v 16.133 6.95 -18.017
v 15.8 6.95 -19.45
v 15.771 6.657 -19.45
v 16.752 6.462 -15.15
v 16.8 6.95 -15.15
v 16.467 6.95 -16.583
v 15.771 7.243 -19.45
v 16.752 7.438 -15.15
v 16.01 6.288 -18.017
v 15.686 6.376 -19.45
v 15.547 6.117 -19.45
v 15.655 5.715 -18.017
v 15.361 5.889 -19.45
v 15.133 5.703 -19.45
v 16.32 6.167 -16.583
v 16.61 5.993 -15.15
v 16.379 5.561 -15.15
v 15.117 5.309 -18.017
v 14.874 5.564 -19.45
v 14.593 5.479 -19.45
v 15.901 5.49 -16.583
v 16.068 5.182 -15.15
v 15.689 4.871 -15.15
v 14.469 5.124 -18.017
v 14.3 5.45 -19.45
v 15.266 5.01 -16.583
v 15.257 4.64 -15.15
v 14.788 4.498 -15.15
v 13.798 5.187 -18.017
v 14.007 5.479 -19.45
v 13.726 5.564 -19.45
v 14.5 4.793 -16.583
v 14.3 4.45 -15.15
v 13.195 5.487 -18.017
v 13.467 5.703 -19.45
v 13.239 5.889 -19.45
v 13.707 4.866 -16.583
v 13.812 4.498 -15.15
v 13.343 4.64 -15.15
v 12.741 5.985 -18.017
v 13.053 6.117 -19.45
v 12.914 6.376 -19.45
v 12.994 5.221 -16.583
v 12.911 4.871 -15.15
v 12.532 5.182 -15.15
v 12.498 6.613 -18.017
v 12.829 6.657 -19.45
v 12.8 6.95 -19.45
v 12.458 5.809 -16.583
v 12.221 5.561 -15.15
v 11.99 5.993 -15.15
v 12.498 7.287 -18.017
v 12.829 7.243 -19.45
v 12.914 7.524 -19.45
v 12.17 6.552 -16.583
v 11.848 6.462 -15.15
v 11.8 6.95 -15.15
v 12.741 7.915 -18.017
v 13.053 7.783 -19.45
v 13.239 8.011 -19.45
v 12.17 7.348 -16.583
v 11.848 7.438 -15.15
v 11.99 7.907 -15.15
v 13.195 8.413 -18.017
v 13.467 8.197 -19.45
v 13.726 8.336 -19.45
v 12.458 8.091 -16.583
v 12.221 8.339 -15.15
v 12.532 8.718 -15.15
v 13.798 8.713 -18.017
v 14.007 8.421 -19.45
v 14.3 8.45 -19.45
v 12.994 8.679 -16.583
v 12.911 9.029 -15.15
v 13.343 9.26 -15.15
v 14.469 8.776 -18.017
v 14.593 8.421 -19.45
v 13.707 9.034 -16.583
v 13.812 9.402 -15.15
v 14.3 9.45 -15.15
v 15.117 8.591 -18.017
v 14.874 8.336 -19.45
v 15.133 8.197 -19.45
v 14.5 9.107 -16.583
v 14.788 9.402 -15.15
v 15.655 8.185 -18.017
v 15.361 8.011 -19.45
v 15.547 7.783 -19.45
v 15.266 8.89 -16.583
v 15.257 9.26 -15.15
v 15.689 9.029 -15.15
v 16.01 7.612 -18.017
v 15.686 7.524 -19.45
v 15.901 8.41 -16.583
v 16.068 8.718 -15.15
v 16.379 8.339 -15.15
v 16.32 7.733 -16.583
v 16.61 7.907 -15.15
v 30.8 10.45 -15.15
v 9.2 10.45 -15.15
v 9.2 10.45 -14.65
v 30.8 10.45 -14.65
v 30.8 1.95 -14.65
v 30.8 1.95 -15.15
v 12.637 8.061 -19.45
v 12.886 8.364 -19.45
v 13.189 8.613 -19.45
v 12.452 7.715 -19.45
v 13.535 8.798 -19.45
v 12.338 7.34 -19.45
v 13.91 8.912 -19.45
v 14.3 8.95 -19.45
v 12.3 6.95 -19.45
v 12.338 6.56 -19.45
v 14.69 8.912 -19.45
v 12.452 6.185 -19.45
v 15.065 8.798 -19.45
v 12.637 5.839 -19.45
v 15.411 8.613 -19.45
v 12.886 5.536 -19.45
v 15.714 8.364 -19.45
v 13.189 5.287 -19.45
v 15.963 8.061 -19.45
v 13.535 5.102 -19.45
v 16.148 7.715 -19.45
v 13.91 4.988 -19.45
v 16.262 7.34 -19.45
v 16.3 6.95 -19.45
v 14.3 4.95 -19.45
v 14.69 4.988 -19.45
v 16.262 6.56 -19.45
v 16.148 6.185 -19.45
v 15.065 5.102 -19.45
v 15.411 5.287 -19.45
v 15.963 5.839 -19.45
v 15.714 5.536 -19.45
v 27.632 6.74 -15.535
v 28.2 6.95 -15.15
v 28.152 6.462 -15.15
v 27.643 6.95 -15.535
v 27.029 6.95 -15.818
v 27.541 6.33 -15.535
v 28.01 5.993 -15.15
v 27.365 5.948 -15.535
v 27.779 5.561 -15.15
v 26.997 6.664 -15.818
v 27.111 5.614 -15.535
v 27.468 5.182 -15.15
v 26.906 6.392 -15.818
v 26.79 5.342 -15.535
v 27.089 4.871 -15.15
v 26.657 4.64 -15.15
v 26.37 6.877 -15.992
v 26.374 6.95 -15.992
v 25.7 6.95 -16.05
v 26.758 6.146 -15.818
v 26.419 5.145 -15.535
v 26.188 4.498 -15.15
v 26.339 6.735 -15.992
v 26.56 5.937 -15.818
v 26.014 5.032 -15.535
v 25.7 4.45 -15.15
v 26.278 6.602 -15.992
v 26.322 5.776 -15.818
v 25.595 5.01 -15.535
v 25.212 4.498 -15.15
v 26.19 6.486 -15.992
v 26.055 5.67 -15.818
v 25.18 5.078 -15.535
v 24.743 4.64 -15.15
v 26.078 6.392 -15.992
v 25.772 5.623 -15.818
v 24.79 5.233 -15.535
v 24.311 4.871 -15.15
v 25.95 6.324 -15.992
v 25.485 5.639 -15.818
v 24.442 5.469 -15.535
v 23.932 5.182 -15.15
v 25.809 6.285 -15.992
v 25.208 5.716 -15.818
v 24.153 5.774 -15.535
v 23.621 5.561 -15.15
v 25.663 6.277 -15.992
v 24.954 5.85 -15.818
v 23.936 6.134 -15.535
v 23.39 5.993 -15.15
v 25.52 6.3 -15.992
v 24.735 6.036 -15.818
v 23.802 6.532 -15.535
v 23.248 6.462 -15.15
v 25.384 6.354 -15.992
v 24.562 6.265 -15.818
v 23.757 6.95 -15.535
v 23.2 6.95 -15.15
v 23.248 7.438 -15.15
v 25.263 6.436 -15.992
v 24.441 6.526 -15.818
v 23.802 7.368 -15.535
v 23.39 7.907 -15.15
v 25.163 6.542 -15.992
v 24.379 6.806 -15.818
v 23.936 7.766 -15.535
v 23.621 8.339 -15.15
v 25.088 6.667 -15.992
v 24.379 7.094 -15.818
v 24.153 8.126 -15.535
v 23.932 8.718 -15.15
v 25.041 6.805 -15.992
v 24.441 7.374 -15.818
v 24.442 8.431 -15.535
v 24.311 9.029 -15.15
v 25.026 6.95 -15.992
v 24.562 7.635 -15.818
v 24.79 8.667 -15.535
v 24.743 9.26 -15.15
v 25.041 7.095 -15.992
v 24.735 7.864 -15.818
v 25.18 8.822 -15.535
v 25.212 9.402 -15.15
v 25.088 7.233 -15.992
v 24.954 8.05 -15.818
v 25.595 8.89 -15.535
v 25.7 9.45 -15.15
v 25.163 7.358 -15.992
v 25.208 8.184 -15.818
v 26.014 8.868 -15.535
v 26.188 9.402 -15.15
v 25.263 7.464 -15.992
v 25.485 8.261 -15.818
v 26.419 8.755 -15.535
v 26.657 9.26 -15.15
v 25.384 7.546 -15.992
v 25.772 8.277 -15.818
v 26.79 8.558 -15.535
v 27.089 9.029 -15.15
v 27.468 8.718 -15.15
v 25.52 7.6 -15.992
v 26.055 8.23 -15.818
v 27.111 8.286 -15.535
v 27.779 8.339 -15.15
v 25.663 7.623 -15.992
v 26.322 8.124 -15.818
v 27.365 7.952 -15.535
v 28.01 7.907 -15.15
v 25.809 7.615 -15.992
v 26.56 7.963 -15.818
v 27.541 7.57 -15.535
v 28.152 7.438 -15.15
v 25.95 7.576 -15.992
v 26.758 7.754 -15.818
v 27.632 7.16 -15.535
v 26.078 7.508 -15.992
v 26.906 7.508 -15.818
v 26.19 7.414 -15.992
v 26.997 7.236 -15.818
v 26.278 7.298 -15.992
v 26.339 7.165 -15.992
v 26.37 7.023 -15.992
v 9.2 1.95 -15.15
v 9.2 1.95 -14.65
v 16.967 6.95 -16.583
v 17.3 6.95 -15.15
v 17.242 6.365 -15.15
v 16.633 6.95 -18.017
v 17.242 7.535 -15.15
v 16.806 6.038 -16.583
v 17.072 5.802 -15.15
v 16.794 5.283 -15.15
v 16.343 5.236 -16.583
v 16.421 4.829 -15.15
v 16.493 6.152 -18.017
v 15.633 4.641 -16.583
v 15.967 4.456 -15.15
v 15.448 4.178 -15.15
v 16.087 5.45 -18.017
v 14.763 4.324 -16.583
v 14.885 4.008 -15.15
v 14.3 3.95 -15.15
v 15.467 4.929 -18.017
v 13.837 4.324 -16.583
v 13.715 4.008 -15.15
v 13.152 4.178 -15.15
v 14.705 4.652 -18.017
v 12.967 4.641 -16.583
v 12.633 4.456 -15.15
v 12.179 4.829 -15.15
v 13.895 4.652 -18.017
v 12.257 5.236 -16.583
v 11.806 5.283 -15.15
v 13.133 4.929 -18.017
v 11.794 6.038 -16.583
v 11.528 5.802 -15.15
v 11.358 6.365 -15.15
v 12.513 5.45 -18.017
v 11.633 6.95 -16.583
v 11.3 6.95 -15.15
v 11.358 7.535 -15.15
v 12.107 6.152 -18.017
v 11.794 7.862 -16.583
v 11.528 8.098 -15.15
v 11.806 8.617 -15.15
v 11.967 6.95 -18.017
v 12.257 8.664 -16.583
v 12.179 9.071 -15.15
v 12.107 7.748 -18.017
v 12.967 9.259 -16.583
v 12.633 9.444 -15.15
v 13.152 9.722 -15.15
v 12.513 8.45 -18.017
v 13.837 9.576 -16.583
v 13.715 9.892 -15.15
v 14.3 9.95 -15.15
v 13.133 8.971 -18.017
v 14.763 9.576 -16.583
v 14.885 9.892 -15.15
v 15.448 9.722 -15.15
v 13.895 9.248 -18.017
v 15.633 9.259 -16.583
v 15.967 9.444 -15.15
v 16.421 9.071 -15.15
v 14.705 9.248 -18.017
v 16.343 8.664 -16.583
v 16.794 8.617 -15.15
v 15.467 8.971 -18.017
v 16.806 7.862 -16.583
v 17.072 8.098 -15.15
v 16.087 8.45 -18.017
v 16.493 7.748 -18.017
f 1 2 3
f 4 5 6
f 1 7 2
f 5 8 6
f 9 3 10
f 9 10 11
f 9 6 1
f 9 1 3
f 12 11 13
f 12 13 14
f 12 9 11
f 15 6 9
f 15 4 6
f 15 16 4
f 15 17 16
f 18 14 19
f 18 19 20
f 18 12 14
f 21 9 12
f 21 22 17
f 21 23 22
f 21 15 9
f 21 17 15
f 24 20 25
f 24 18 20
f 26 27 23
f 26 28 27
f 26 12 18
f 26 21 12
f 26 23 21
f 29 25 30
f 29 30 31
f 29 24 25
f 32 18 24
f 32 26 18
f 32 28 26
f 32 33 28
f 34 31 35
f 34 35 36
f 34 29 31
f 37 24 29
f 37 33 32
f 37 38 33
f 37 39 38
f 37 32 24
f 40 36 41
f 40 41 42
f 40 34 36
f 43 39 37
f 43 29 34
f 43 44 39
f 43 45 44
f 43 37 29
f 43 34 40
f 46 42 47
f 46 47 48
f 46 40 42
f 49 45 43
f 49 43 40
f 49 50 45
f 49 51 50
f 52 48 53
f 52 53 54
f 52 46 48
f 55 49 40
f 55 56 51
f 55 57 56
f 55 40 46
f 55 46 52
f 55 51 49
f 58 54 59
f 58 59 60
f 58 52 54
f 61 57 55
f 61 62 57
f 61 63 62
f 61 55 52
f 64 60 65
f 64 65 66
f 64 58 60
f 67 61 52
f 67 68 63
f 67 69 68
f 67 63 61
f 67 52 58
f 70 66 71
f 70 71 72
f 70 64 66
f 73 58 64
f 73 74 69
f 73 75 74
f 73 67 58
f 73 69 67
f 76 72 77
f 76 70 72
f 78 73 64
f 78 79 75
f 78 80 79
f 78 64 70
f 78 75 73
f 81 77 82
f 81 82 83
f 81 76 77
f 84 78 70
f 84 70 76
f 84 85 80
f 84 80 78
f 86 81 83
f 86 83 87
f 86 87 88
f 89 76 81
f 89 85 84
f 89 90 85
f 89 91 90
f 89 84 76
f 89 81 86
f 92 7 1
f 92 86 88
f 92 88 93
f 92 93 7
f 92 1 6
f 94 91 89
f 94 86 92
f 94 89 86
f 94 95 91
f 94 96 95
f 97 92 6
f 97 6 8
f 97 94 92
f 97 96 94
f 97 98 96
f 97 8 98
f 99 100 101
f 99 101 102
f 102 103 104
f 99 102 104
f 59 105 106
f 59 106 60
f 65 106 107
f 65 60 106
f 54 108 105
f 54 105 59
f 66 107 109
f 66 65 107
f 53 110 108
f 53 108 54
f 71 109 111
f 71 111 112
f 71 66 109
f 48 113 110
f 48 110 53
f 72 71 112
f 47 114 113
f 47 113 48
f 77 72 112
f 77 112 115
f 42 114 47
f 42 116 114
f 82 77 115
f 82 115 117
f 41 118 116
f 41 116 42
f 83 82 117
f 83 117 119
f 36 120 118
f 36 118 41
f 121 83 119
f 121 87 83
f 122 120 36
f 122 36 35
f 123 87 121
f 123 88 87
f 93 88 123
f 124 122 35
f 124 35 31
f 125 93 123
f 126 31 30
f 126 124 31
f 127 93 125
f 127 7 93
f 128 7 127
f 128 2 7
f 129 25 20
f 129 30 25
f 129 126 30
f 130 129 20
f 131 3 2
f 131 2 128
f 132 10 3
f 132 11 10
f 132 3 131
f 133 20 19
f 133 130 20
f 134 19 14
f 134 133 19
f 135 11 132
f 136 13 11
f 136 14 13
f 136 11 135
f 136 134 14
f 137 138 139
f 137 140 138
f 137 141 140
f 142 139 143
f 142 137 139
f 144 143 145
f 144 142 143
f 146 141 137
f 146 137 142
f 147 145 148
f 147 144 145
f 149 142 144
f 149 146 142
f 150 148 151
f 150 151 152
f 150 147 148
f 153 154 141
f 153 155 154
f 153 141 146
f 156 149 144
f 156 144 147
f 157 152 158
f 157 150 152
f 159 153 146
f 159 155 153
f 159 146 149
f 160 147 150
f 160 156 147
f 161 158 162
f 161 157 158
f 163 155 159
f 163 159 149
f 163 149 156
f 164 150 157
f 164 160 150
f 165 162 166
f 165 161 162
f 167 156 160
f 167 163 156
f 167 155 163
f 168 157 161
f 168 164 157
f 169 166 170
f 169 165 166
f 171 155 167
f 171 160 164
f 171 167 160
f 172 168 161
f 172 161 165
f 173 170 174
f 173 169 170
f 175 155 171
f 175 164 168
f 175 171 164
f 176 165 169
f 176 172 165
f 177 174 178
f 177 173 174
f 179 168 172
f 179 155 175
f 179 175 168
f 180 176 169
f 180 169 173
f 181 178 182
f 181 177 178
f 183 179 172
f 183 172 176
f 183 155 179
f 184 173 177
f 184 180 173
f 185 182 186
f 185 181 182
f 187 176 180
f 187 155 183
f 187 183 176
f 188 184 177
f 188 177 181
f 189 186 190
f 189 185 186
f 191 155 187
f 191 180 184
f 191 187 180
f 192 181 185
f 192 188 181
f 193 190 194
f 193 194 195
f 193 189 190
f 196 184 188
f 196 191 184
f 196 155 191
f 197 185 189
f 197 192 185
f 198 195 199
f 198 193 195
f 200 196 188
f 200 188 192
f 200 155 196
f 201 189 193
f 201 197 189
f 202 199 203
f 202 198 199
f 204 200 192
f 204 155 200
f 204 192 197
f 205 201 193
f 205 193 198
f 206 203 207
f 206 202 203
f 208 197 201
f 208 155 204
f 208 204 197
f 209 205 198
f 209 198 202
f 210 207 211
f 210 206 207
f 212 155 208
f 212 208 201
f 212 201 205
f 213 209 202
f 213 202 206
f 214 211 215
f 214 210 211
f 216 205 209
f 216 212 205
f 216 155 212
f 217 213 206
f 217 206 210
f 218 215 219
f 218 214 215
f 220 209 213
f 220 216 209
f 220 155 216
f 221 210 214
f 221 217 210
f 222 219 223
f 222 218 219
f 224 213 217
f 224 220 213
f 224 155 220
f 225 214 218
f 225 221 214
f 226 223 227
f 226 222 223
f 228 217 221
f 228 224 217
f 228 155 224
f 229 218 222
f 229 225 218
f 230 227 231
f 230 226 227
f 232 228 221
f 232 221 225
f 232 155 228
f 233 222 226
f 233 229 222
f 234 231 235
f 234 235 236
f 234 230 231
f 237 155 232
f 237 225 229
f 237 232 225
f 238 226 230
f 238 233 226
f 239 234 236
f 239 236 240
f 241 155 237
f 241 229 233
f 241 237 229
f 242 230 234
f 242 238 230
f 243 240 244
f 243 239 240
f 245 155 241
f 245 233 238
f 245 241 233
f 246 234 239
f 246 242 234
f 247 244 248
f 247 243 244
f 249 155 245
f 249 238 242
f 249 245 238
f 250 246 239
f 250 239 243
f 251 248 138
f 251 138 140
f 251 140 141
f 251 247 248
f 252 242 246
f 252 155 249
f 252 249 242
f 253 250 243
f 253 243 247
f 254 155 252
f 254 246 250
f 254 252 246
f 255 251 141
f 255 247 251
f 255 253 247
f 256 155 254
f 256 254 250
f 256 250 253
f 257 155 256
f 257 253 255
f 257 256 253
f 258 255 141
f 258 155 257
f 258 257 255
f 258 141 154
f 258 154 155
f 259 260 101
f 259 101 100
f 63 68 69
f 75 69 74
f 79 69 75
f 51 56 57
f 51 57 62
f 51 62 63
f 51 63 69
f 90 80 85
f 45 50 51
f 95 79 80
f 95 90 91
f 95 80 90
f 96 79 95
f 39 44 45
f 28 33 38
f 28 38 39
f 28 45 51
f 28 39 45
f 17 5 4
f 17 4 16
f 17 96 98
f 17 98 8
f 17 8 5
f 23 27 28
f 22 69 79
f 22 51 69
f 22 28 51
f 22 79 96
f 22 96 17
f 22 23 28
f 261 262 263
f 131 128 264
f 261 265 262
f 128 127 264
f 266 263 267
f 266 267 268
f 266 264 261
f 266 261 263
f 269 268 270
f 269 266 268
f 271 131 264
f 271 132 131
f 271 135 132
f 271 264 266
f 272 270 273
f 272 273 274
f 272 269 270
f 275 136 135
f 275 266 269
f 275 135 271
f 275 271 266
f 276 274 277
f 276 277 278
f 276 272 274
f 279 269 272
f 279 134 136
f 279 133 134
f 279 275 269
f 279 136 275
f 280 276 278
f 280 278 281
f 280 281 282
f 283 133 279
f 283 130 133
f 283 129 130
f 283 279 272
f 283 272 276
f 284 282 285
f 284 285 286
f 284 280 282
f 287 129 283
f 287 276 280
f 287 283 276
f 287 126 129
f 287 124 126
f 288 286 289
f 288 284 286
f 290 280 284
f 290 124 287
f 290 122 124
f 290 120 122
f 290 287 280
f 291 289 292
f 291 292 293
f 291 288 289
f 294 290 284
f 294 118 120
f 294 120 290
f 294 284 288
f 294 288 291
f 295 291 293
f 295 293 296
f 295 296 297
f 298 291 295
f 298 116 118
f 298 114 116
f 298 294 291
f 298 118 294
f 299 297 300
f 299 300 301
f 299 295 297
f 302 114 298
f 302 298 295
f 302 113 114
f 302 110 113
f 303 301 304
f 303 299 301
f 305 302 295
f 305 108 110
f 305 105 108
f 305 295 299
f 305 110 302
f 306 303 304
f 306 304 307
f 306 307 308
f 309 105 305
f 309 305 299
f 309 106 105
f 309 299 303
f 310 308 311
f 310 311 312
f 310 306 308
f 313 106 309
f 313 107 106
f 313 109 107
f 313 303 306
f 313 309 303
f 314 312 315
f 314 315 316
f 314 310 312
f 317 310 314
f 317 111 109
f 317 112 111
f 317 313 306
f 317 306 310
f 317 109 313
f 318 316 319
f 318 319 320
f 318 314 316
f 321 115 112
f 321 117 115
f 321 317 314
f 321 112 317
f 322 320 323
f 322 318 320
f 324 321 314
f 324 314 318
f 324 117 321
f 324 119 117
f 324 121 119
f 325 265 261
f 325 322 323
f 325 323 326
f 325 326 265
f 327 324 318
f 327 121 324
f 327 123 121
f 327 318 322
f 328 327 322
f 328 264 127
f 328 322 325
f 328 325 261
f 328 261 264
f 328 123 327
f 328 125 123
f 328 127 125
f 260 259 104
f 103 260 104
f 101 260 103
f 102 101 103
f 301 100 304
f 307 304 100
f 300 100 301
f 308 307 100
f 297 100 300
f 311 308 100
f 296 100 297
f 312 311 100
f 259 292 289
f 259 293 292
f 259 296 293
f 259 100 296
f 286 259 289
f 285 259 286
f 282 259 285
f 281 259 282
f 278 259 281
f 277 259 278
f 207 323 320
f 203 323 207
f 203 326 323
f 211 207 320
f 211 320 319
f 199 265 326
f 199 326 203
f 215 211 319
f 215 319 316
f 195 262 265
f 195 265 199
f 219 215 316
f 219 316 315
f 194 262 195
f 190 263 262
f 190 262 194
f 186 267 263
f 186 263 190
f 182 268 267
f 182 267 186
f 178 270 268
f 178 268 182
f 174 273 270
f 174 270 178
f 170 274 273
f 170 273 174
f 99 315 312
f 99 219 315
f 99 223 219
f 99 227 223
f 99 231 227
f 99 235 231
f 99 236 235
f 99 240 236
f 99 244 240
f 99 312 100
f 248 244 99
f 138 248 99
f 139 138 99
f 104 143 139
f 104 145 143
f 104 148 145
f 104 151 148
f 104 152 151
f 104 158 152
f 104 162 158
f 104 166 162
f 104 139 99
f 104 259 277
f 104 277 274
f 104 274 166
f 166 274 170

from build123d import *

# Parameters (mm, degrees)
SERIES_PLATE_21_6_X_8_5_X_0_5_SKETCH_W = 21.6
SERIES_PLATE_21_6_X_8_5_X_0_5_SKETCH_H = 0.5
SERIES_PLATE_21_6_X_8_5_X_0_5_DEPTH    = 8.5


with BuildPart() as part:
    # Series Plate 21.6 x 8.5 x 0.5 Sketch → Series Plate 21.6 x 8.5 x 0.5 (new body)
    with BuildSketch(Plane(origin=(0, 1.95, 0), x_dir=(1, 0, 0), z_dir=(0, 1, 0))):
        with Locations((20, 14.9)):
            Rectangle(SERIES_PLATE_21_6_X_8_5_X_0_5_SKETCH_W, SERIES_PLATE_21_6_X_8_5_X_0_5_SKETCH_H)
    extrude(amount=SERIES_PLATE_21_6_X_8_5_X_0_5_DEPTH)

    # Spring (compressed 4.3) Sketch → Spring (compressed 4.3) (revolve)
    with BuildSketch(Plane(origin=(0, 6.95, 0), x_dir=(1, 0, 0), z_dir=(0, 1, 0))):
        Polygon((16.8, 15.15), (17.3, 15.15), (16.3, 19.45), (15.8, 19.45), align=None)
    revolve(axis=Axis((14.3, 6.95, -14.15), (0, 0, -1)))

    # Dimple 0.9 Sketch → Dimple 0.9 (revolve)
    with BuildSketch(Plane(origin=(0, 6.95, 0), x_dir=(1, 0, 0), z_dir=(0, 1, 0))):
        with BuildLine():
            Line((25.7, 15.15), (28.2, 15.15))
            ThreePointArc((28.2, 15.15), (27.028533026, 15.818147293), (25.7, 16.05))
            Line((25.7, 16.05), (25.7, 15.15))
        make_face()
    revolve(axis=Axis((25.7, 6.95, -14.15), (0, 0, -1)))


solid = part.part
